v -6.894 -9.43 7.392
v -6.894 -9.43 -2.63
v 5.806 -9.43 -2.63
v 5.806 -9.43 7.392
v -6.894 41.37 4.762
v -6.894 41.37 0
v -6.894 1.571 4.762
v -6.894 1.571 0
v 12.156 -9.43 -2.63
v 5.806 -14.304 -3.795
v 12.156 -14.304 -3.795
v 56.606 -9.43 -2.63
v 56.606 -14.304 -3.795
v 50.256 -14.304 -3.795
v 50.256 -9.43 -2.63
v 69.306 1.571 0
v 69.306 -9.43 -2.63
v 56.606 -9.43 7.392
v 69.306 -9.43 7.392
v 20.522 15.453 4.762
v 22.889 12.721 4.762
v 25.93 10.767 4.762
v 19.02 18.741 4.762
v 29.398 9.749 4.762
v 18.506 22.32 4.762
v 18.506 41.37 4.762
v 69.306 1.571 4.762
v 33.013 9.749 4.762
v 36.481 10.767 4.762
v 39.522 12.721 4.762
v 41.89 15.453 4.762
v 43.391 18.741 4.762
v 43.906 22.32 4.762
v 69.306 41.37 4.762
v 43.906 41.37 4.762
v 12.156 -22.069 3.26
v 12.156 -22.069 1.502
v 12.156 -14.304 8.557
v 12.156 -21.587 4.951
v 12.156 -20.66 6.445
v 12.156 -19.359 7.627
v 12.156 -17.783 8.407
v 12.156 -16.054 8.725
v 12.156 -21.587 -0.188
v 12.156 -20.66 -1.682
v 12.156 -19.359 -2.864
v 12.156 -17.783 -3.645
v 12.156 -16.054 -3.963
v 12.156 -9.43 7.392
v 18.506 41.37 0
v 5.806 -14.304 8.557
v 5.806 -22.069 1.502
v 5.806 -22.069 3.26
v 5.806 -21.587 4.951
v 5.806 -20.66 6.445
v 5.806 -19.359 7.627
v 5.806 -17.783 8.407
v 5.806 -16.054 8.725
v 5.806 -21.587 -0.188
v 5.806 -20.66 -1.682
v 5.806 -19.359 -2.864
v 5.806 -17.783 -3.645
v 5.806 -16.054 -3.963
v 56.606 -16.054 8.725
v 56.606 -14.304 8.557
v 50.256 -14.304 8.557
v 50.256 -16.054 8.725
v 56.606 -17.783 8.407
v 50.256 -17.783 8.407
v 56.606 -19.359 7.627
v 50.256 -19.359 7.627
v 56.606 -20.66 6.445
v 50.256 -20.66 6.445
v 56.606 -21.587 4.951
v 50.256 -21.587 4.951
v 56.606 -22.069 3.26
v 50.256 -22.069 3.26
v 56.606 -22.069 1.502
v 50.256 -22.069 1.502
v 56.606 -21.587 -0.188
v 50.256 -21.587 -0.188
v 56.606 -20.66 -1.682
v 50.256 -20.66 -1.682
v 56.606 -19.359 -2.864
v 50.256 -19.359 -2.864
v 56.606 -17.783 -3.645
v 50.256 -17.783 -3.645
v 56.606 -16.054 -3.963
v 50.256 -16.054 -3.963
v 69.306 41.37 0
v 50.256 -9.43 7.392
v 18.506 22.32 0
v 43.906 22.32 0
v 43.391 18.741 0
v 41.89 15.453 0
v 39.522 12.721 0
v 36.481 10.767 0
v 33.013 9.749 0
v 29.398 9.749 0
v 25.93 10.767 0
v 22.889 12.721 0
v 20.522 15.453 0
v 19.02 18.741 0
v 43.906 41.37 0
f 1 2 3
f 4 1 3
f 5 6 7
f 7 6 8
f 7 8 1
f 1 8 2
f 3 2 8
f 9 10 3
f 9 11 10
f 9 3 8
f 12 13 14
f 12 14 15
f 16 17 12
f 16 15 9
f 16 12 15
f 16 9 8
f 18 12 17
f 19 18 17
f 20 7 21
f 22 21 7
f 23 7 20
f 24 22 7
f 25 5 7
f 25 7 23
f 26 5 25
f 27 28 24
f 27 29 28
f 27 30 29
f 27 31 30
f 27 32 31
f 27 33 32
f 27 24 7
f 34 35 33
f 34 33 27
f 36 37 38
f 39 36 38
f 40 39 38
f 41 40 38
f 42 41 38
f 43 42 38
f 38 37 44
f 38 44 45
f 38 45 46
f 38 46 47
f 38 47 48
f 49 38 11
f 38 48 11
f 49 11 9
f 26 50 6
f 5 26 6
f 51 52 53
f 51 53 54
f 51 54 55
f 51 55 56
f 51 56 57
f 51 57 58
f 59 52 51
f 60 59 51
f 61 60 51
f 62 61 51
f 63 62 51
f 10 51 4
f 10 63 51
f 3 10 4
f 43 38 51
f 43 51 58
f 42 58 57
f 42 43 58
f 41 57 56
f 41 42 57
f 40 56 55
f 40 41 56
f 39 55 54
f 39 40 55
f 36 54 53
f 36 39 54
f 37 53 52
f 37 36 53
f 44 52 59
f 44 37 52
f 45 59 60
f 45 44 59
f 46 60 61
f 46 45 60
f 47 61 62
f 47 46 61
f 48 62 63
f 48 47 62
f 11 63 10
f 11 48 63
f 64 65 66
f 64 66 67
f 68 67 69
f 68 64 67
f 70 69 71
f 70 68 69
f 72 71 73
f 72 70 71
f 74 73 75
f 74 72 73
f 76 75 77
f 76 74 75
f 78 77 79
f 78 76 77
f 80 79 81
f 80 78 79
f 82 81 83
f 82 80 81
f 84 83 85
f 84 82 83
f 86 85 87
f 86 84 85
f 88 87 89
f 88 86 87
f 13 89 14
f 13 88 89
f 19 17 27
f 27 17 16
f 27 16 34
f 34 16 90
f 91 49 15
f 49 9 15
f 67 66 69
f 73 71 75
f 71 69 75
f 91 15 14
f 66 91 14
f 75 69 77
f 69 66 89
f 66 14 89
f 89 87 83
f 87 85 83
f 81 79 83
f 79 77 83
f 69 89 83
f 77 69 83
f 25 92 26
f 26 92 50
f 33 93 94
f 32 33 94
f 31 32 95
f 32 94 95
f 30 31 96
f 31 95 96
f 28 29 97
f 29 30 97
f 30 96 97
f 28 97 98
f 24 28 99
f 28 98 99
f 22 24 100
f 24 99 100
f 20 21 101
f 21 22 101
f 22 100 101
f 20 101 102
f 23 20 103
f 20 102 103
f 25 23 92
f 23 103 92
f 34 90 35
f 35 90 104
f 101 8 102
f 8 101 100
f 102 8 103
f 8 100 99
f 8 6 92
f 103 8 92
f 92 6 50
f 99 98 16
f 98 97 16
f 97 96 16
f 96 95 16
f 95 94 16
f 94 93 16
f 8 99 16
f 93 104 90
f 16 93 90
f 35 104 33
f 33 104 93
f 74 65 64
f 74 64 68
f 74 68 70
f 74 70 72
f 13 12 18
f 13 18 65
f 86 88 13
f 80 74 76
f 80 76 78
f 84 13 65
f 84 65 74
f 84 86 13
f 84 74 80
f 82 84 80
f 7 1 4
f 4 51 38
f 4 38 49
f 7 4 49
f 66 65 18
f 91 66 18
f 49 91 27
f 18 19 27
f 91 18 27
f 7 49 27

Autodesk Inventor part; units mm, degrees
ref_plane "YZ Plane" through (0, 0, 0) normal (1, 0, 0) x (0, 1, 0)
ref_plane "XZ Plane" through (0, 0, 0) normal (0, 1, 0) x (-1, 0, 0)
ref_plane "XY Plane" through (0, 0, 0) normal (0, 0, 1) x (1, 0, 0)
sketch "Sketch1" plane through (0, 0, 0) normal (0, 0, 1) x (1, 0, 0)
  line L0 (-6.8944, -9.4305) -> (69.3056, -9.4305)
  line L1 (69.3056, -9.4305) -> (69.3056, 41.3695)
  line L2 (69.3056, 41.3695) -> (-6.8944, 41.3695)
  line L3 (-6.8944, 41.3695) -> (-6.8944, -9.4305)
  line L4 (18.5056, 41.3695) -> (43.9056, 41.3695)
  line L5 (43.9056, 41.3695) -> (43.9056, 22.3195)
  line L6 (43.9056, 22.3195) -> (18.5056, 22.3195)
  line L7 (18.5056, 22.3195) -> (18.5056, 41.3695)
  arc A0 (18.5056, 22.3195) -> (43.9056, 22.3195) centre (31.2056, 22.3195) ccw
  point P0 (0, 0)
  point P1 (14.7078, 41.3695)
  point P2 (47.7034, 41.3695)
  point P3 (31.2056, 41.3695)
  dimension "d0" = 76.2
  dimension "d1" = 50.8
  dimension "d6" = 25.4
  dimension "d7" = 19.05
extrude "Extrusion2" add sketch "Sketch1" along normal blind 4.7625 contours L3 L2 L7 A0 L5 L1 L0
sketch "Sketch2" plane through (69.3056, -9.4305, 0) normal (1, 0, 0) x (0, 0, -1)
  line L0 (-4.7625, 50.8) -> (-4.7625, 0) projected
  line L1 (0, 0) -> (-4.7625, 0) projected
  line L2 (0, 0) -> (0, 50.8) projected
  line L3 (0, 50.8) -> (-4.7625, 50.8) projected
  circle A0 centre (-2.3813, -6.35) radius 6.35
  line L4 (3.7948, -4.8737) -> (0, 11.0013)
  line L5 (-8.5573, -4.8737) -> (-4.7625, 11.0013)
  point P0 (0, 9.4305)
  point P1 (-2.3813, 0)
  dimension "d10" = 12.7
  dimension "d11" = 15.875
extrude "Extrusion3" add sketch "Sketch2" against normal up to surface (76.2 mm away) contours L0 L1 A0 L5 | A0 | L4 A0 L1 L2
sketch "Sketch3" plane through (0, 0, 4.7625) normal (0, 0, 1) x (1, 0, 0)
  arc A0 (18.5056, 22.3195) -> (43.9056, 22.3195) centre (31.2056, 22.3195) ccw projected
  line L0 (56.6056, -9.4305) -> (56.6056, -22.1305)
  line L1 (5.8056, -22.1305) -> (5.8056, -9.4305)
  line L2 (69.3056, -9.4305) -> (69.3056, -22.1305)
  line L3 (-6.8944, -22.1305) -> (-6.8944, -9.4305)
  line L4 (5.8056, -22.1305) -> (-6.8944, -22.1305)
  line L5 (-6.8944, -9.4305) -> (5.8056, -9.4305)
  line L6 (56.6056, -9.4305) -> (69.3056, -9.4305)
  line L7 (69.3056, -22.1305) -> (56.6056, -22.1305)
  line L8 (12.1556, -9.4305) -> (50.2556, -9.4305)
  line L9 (50.2556, -9.4305) -> (50.2556, -22.1305)
  line L10 (50.2556, -22.1305) -> (12.1556, -22.1305)
  line L11 (12.1556, -22.1305) -> (12.1556, -9.4305)
  point P0 (0, 0)
  point P1 (31.2056, 9.6195)
  point P2 (31.2056, -9.4305)
  dimension "d14" = 50.8
  dimension "d18" = 76.2
  dimension "d19" = 6.35
  dimension "d20" = 6.35
  dimension "d21" = 12.7
  dimension "d22" = 19.05
extrude "Extrusion4" cut sketch "Sketch3" along normal through all both and the other way through all
properties part number "kinect bracket"
